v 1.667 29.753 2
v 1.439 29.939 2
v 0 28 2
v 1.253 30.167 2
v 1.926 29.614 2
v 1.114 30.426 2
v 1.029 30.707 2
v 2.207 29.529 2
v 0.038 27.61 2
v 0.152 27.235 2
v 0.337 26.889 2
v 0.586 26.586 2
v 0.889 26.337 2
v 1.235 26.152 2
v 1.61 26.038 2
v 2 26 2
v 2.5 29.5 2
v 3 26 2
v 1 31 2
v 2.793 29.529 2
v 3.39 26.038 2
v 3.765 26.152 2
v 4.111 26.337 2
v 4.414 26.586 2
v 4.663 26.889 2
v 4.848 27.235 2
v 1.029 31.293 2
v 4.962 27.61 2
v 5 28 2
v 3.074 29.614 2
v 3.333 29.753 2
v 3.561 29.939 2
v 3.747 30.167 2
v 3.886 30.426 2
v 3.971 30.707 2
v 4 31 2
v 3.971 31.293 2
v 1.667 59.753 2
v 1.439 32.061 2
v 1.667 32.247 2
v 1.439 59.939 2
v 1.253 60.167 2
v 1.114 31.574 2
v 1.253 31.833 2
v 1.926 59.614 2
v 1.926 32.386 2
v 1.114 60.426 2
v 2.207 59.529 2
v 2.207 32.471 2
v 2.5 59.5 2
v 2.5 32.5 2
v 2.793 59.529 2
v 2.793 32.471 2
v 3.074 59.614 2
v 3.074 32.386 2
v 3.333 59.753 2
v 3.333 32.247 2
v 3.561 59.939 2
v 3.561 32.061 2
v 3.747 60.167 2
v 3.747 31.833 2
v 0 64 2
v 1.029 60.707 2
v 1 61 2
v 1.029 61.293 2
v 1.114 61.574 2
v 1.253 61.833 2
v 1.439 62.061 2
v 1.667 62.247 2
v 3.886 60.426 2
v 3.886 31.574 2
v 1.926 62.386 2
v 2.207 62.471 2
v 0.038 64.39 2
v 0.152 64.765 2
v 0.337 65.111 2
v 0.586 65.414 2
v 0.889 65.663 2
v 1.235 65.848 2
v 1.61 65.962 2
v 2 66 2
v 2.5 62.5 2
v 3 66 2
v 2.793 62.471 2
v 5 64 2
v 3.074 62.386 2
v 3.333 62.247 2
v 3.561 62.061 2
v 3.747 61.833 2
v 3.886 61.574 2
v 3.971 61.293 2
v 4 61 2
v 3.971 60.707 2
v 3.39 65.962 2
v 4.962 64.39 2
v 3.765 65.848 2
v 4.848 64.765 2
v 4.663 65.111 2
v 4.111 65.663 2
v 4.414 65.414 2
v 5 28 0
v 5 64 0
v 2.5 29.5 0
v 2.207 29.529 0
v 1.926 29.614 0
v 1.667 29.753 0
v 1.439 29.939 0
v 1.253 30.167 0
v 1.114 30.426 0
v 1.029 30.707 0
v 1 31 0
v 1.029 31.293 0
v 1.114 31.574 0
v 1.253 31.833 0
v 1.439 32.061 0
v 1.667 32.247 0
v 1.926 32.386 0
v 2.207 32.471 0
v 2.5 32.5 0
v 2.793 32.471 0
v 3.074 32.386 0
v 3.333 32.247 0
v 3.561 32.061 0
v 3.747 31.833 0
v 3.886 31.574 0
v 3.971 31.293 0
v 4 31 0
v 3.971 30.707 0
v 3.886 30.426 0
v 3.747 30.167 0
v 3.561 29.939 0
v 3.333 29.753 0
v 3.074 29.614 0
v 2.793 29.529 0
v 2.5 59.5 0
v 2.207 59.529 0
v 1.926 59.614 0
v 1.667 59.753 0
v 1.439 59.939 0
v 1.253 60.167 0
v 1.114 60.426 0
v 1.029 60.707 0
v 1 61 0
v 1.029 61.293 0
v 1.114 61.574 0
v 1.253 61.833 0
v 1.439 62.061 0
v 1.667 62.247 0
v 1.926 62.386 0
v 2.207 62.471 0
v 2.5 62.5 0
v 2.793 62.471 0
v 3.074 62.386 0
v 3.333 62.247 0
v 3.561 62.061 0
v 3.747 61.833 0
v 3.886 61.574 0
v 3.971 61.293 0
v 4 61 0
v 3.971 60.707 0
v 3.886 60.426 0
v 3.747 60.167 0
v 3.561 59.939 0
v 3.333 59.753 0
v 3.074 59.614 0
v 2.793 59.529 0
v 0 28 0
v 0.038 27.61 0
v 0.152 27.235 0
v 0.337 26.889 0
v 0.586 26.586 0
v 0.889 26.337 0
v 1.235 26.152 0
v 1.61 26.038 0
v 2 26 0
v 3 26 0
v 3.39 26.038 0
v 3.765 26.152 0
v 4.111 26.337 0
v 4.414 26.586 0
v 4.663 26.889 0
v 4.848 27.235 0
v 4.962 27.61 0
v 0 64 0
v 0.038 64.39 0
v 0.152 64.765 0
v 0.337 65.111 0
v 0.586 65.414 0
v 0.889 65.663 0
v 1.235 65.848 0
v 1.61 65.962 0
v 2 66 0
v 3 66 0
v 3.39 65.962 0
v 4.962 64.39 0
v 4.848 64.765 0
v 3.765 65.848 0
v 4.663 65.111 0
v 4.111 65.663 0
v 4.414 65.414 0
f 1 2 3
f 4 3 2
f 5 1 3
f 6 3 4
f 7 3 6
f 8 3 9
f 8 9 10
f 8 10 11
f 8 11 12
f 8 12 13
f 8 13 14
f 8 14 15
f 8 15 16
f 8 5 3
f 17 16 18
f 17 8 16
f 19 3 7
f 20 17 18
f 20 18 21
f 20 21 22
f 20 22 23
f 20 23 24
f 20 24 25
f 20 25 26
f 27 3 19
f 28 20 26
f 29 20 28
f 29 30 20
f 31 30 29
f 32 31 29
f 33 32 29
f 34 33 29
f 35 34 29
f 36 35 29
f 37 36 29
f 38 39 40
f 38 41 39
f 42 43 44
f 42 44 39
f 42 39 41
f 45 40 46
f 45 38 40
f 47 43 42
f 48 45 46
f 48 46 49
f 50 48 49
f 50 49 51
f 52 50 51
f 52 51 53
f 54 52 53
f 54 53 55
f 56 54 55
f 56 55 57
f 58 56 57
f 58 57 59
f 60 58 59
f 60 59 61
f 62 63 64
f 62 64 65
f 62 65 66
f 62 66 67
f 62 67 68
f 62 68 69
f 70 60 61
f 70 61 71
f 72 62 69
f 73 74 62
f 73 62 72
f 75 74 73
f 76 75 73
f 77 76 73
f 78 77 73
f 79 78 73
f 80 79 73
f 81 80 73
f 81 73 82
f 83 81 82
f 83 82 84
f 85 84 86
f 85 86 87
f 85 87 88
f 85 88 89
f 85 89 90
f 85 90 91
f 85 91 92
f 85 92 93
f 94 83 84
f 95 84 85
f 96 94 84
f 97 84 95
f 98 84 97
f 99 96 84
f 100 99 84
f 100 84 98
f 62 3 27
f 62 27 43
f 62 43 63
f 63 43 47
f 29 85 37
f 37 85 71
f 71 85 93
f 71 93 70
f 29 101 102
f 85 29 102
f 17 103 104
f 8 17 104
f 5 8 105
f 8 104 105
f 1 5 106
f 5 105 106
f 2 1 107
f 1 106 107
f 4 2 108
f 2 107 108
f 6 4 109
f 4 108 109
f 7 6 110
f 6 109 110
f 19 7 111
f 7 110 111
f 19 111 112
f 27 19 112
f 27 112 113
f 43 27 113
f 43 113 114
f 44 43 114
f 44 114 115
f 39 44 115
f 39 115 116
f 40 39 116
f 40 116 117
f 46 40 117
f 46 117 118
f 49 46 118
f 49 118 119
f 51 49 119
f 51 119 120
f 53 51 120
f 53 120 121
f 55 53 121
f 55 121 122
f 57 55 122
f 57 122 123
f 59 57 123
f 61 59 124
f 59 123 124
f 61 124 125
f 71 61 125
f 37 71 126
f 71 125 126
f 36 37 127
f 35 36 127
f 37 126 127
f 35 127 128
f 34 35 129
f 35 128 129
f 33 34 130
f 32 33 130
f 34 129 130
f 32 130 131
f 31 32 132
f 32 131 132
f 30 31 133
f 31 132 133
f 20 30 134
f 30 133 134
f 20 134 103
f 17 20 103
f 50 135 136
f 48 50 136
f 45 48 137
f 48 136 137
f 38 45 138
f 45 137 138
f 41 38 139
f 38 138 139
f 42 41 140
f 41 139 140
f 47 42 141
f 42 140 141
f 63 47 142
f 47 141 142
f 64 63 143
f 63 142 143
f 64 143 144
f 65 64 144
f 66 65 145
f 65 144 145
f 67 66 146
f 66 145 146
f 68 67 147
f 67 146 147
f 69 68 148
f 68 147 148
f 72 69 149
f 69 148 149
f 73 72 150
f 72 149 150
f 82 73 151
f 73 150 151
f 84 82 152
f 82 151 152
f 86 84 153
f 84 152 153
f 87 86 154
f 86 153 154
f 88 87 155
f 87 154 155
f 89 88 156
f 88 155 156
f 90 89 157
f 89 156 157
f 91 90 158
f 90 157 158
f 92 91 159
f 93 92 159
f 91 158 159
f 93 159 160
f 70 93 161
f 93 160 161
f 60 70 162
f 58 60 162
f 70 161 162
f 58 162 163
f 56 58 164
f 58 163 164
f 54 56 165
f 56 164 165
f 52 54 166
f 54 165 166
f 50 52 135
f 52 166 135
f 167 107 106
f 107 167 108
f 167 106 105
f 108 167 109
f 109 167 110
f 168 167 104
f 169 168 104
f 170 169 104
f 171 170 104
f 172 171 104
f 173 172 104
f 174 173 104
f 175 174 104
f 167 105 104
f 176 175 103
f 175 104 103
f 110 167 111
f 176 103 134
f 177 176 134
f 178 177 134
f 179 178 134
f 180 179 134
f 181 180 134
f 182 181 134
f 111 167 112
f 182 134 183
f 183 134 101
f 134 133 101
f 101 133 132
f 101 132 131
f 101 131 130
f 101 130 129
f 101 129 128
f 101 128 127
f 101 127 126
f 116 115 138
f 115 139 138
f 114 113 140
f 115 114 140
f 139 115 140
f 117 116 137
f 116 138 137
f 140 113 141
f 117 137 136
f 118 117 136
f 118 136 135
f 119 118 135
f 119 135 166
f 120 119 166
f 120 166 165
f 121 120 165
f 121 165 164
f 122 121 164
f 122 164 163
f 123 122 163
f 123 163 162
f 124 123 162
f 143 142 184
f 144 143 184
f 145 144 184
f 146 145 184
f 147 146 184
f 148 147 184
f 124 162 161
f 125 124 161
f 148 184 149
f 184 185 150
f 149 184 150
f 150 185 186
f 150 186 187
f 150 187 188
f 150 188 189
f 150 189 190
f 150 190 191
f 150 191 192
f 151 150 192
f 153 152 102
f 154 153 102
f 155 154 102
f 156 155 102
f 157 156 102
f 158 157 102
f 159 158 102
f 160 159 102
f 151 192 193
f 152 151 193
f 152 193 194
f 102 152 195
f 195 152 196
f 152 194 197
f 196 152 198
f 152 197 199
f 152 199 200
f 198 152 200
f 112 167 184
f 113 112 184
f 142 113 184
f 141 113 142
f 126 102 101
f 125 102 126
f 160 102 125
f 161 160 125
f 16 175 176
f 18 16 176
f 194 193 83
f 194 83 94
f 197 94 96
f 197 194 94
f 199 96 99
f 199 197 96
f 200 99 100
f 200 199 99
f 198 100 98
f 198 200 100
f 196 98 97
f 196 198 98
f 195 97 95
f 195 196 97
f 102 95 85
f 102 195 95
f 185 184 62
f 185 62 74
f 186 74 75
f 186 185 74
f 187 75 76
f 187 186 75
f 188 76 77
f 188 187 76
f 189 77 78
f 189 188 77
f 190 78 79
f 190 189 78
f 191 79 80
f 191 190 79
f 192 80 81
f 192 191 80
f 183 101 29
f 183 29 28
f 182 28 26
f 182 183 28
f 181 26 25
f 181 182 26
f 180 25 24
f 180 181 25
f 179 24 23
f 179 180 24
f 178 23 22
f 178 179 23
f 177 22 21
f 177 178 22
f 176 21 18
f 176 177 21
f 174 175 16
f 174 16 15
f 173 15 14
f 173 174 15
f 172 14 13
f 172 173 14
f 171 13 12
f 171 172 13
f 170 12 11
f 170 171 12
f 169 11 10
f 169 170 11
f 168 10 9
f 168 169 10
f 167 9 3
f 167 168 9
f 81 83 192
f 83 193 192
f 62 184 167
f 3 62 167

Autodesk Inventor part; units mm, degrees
ref_plane "YZ Plane" through (0, 0, 0) normal (1, 0, 0) x (0, 1, 0)
ref_plane "XZ Plane" through (0, 0, 0) normal (0, 1, 0) x (-1, 0, 0)
ref_plane "XY Plane" through (0, 0, 0) normal (0, 0, 1) x (1, 0, 0)
sketch "Skizze1" plane through (0, 0, 0) normal (0, 0, 1) x (1, 0, 0)
  line L0 (2, 26) -> (3, 26)
  line L1 (5, 28) -> (5, 64)
  line L2 (3, 66) -> (2, 66)
  line L3 (0, 64) -> (0, 28)
  arc A0 (5, 64) -> (3, 66) centre (3, 64) ccw
  arc A1 (3, 26) -> (5, 28) centre (3, 28) ccw
  arc A2 (0, 28) -> (2, 26) centre (2, 28) ccw
  arc A3 (2, 66) -> (0, 64) centre (2, 64) ccw
  point P0 (0, 0)
  point P1 (0, 26)
  point P2 (5, 66)
  point P3 (5, 26)
  point P4 (0, 66)
  dimension "d0" = 5
  dimension "d1" = 40
  dimension "d2" = 2
extrude "Extrusion1" add sketch "Skizze1" along normal blind 2
hole "Bohrung1" at (2.5, 61, 2) direction (0, 0, -1) diameter 3 end through all
hole "Bohrung2" at (2.5, 31, 2) direction (0, 0, -1) diameter 3 end through all
properties part number "Halter_Verschraubung"
